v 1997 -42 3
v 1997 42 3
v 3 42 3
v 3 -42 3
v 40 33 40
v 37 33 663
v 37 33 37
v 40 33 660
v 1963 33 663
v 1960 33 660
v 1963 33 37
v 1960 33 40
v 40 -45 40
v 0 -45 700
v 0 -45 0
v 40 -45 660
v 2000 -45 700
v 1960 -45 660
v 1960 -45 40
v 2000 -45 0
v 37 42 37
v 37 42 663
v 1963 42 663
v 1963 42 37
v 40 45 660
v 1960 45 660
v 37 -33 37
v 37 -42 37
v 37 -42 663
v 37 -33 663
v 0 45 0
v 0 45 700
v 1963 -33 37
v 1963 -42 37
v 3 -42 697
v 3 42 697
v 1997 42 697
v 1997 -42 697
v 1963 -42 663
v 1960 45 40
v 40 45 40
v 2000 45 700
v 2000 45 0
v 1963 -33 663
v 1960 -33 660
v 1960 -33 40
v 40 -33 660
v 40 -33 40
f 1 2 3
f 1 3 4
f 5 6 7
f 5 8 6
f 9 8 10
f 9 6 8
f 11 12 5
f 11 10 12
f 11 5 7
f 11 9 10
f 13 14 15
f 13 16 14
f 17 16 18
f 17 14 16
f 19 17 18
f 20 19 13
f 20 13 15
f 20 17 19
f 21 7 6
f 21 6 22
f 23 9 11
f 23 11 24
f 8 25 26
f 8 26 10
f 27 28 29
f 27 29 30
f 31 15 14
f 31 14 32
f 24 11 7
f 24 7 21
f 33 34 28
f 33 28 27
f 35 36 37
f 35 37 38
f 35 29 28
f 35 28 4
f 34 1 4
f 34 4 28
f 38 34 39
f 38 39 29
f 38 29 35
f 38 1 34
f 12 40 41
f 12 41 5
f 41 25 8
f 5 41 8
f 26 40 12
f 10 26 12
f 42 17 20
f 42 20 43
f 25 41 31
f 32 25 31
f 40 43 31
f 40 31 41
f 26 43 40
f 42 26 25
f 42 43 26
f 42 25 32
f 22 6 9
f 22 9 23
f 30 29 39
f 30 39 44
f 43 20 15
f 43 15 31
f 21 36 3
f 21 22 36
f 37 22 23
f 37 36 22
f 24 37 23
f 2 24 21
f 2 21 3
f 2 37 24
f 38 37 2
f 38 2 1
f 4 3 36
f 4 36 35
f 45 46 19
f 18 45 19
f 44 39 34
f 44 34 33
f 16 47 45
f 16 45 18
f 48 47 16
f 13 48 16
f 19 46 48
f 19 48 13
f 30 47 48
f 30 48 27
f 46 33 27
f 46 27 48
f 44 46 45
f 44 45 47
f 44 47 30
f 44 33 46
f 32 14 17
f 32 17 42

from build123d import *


with BuildPart() as f2:
    # F2: sweep along a path in F0
    with BuildLine(Plane.XZ) as f2_path:
        Line((0, 0), (2000, 0))
        Line((2000, 0), (2000, 700))
        Line((2000, 700), (0, 700))
        Line((0, 700), (0, 0))
    # F1 (on Right) → F2 (sweep)
    with BuildSketch(Plane.YZ):
        Polygon((-45, 0), (0, 0), (45, 0), (45, 40), (33, 40), (33, 37), (42, 37), (42, 3), (0, 3), (-42, 3), (-42, 37), (-33, 37), (-33, 40), (-45, 40), align=None)
    sweep(path=f2_path.line, transition=Transition.RIGHT)


solid = f2.part
